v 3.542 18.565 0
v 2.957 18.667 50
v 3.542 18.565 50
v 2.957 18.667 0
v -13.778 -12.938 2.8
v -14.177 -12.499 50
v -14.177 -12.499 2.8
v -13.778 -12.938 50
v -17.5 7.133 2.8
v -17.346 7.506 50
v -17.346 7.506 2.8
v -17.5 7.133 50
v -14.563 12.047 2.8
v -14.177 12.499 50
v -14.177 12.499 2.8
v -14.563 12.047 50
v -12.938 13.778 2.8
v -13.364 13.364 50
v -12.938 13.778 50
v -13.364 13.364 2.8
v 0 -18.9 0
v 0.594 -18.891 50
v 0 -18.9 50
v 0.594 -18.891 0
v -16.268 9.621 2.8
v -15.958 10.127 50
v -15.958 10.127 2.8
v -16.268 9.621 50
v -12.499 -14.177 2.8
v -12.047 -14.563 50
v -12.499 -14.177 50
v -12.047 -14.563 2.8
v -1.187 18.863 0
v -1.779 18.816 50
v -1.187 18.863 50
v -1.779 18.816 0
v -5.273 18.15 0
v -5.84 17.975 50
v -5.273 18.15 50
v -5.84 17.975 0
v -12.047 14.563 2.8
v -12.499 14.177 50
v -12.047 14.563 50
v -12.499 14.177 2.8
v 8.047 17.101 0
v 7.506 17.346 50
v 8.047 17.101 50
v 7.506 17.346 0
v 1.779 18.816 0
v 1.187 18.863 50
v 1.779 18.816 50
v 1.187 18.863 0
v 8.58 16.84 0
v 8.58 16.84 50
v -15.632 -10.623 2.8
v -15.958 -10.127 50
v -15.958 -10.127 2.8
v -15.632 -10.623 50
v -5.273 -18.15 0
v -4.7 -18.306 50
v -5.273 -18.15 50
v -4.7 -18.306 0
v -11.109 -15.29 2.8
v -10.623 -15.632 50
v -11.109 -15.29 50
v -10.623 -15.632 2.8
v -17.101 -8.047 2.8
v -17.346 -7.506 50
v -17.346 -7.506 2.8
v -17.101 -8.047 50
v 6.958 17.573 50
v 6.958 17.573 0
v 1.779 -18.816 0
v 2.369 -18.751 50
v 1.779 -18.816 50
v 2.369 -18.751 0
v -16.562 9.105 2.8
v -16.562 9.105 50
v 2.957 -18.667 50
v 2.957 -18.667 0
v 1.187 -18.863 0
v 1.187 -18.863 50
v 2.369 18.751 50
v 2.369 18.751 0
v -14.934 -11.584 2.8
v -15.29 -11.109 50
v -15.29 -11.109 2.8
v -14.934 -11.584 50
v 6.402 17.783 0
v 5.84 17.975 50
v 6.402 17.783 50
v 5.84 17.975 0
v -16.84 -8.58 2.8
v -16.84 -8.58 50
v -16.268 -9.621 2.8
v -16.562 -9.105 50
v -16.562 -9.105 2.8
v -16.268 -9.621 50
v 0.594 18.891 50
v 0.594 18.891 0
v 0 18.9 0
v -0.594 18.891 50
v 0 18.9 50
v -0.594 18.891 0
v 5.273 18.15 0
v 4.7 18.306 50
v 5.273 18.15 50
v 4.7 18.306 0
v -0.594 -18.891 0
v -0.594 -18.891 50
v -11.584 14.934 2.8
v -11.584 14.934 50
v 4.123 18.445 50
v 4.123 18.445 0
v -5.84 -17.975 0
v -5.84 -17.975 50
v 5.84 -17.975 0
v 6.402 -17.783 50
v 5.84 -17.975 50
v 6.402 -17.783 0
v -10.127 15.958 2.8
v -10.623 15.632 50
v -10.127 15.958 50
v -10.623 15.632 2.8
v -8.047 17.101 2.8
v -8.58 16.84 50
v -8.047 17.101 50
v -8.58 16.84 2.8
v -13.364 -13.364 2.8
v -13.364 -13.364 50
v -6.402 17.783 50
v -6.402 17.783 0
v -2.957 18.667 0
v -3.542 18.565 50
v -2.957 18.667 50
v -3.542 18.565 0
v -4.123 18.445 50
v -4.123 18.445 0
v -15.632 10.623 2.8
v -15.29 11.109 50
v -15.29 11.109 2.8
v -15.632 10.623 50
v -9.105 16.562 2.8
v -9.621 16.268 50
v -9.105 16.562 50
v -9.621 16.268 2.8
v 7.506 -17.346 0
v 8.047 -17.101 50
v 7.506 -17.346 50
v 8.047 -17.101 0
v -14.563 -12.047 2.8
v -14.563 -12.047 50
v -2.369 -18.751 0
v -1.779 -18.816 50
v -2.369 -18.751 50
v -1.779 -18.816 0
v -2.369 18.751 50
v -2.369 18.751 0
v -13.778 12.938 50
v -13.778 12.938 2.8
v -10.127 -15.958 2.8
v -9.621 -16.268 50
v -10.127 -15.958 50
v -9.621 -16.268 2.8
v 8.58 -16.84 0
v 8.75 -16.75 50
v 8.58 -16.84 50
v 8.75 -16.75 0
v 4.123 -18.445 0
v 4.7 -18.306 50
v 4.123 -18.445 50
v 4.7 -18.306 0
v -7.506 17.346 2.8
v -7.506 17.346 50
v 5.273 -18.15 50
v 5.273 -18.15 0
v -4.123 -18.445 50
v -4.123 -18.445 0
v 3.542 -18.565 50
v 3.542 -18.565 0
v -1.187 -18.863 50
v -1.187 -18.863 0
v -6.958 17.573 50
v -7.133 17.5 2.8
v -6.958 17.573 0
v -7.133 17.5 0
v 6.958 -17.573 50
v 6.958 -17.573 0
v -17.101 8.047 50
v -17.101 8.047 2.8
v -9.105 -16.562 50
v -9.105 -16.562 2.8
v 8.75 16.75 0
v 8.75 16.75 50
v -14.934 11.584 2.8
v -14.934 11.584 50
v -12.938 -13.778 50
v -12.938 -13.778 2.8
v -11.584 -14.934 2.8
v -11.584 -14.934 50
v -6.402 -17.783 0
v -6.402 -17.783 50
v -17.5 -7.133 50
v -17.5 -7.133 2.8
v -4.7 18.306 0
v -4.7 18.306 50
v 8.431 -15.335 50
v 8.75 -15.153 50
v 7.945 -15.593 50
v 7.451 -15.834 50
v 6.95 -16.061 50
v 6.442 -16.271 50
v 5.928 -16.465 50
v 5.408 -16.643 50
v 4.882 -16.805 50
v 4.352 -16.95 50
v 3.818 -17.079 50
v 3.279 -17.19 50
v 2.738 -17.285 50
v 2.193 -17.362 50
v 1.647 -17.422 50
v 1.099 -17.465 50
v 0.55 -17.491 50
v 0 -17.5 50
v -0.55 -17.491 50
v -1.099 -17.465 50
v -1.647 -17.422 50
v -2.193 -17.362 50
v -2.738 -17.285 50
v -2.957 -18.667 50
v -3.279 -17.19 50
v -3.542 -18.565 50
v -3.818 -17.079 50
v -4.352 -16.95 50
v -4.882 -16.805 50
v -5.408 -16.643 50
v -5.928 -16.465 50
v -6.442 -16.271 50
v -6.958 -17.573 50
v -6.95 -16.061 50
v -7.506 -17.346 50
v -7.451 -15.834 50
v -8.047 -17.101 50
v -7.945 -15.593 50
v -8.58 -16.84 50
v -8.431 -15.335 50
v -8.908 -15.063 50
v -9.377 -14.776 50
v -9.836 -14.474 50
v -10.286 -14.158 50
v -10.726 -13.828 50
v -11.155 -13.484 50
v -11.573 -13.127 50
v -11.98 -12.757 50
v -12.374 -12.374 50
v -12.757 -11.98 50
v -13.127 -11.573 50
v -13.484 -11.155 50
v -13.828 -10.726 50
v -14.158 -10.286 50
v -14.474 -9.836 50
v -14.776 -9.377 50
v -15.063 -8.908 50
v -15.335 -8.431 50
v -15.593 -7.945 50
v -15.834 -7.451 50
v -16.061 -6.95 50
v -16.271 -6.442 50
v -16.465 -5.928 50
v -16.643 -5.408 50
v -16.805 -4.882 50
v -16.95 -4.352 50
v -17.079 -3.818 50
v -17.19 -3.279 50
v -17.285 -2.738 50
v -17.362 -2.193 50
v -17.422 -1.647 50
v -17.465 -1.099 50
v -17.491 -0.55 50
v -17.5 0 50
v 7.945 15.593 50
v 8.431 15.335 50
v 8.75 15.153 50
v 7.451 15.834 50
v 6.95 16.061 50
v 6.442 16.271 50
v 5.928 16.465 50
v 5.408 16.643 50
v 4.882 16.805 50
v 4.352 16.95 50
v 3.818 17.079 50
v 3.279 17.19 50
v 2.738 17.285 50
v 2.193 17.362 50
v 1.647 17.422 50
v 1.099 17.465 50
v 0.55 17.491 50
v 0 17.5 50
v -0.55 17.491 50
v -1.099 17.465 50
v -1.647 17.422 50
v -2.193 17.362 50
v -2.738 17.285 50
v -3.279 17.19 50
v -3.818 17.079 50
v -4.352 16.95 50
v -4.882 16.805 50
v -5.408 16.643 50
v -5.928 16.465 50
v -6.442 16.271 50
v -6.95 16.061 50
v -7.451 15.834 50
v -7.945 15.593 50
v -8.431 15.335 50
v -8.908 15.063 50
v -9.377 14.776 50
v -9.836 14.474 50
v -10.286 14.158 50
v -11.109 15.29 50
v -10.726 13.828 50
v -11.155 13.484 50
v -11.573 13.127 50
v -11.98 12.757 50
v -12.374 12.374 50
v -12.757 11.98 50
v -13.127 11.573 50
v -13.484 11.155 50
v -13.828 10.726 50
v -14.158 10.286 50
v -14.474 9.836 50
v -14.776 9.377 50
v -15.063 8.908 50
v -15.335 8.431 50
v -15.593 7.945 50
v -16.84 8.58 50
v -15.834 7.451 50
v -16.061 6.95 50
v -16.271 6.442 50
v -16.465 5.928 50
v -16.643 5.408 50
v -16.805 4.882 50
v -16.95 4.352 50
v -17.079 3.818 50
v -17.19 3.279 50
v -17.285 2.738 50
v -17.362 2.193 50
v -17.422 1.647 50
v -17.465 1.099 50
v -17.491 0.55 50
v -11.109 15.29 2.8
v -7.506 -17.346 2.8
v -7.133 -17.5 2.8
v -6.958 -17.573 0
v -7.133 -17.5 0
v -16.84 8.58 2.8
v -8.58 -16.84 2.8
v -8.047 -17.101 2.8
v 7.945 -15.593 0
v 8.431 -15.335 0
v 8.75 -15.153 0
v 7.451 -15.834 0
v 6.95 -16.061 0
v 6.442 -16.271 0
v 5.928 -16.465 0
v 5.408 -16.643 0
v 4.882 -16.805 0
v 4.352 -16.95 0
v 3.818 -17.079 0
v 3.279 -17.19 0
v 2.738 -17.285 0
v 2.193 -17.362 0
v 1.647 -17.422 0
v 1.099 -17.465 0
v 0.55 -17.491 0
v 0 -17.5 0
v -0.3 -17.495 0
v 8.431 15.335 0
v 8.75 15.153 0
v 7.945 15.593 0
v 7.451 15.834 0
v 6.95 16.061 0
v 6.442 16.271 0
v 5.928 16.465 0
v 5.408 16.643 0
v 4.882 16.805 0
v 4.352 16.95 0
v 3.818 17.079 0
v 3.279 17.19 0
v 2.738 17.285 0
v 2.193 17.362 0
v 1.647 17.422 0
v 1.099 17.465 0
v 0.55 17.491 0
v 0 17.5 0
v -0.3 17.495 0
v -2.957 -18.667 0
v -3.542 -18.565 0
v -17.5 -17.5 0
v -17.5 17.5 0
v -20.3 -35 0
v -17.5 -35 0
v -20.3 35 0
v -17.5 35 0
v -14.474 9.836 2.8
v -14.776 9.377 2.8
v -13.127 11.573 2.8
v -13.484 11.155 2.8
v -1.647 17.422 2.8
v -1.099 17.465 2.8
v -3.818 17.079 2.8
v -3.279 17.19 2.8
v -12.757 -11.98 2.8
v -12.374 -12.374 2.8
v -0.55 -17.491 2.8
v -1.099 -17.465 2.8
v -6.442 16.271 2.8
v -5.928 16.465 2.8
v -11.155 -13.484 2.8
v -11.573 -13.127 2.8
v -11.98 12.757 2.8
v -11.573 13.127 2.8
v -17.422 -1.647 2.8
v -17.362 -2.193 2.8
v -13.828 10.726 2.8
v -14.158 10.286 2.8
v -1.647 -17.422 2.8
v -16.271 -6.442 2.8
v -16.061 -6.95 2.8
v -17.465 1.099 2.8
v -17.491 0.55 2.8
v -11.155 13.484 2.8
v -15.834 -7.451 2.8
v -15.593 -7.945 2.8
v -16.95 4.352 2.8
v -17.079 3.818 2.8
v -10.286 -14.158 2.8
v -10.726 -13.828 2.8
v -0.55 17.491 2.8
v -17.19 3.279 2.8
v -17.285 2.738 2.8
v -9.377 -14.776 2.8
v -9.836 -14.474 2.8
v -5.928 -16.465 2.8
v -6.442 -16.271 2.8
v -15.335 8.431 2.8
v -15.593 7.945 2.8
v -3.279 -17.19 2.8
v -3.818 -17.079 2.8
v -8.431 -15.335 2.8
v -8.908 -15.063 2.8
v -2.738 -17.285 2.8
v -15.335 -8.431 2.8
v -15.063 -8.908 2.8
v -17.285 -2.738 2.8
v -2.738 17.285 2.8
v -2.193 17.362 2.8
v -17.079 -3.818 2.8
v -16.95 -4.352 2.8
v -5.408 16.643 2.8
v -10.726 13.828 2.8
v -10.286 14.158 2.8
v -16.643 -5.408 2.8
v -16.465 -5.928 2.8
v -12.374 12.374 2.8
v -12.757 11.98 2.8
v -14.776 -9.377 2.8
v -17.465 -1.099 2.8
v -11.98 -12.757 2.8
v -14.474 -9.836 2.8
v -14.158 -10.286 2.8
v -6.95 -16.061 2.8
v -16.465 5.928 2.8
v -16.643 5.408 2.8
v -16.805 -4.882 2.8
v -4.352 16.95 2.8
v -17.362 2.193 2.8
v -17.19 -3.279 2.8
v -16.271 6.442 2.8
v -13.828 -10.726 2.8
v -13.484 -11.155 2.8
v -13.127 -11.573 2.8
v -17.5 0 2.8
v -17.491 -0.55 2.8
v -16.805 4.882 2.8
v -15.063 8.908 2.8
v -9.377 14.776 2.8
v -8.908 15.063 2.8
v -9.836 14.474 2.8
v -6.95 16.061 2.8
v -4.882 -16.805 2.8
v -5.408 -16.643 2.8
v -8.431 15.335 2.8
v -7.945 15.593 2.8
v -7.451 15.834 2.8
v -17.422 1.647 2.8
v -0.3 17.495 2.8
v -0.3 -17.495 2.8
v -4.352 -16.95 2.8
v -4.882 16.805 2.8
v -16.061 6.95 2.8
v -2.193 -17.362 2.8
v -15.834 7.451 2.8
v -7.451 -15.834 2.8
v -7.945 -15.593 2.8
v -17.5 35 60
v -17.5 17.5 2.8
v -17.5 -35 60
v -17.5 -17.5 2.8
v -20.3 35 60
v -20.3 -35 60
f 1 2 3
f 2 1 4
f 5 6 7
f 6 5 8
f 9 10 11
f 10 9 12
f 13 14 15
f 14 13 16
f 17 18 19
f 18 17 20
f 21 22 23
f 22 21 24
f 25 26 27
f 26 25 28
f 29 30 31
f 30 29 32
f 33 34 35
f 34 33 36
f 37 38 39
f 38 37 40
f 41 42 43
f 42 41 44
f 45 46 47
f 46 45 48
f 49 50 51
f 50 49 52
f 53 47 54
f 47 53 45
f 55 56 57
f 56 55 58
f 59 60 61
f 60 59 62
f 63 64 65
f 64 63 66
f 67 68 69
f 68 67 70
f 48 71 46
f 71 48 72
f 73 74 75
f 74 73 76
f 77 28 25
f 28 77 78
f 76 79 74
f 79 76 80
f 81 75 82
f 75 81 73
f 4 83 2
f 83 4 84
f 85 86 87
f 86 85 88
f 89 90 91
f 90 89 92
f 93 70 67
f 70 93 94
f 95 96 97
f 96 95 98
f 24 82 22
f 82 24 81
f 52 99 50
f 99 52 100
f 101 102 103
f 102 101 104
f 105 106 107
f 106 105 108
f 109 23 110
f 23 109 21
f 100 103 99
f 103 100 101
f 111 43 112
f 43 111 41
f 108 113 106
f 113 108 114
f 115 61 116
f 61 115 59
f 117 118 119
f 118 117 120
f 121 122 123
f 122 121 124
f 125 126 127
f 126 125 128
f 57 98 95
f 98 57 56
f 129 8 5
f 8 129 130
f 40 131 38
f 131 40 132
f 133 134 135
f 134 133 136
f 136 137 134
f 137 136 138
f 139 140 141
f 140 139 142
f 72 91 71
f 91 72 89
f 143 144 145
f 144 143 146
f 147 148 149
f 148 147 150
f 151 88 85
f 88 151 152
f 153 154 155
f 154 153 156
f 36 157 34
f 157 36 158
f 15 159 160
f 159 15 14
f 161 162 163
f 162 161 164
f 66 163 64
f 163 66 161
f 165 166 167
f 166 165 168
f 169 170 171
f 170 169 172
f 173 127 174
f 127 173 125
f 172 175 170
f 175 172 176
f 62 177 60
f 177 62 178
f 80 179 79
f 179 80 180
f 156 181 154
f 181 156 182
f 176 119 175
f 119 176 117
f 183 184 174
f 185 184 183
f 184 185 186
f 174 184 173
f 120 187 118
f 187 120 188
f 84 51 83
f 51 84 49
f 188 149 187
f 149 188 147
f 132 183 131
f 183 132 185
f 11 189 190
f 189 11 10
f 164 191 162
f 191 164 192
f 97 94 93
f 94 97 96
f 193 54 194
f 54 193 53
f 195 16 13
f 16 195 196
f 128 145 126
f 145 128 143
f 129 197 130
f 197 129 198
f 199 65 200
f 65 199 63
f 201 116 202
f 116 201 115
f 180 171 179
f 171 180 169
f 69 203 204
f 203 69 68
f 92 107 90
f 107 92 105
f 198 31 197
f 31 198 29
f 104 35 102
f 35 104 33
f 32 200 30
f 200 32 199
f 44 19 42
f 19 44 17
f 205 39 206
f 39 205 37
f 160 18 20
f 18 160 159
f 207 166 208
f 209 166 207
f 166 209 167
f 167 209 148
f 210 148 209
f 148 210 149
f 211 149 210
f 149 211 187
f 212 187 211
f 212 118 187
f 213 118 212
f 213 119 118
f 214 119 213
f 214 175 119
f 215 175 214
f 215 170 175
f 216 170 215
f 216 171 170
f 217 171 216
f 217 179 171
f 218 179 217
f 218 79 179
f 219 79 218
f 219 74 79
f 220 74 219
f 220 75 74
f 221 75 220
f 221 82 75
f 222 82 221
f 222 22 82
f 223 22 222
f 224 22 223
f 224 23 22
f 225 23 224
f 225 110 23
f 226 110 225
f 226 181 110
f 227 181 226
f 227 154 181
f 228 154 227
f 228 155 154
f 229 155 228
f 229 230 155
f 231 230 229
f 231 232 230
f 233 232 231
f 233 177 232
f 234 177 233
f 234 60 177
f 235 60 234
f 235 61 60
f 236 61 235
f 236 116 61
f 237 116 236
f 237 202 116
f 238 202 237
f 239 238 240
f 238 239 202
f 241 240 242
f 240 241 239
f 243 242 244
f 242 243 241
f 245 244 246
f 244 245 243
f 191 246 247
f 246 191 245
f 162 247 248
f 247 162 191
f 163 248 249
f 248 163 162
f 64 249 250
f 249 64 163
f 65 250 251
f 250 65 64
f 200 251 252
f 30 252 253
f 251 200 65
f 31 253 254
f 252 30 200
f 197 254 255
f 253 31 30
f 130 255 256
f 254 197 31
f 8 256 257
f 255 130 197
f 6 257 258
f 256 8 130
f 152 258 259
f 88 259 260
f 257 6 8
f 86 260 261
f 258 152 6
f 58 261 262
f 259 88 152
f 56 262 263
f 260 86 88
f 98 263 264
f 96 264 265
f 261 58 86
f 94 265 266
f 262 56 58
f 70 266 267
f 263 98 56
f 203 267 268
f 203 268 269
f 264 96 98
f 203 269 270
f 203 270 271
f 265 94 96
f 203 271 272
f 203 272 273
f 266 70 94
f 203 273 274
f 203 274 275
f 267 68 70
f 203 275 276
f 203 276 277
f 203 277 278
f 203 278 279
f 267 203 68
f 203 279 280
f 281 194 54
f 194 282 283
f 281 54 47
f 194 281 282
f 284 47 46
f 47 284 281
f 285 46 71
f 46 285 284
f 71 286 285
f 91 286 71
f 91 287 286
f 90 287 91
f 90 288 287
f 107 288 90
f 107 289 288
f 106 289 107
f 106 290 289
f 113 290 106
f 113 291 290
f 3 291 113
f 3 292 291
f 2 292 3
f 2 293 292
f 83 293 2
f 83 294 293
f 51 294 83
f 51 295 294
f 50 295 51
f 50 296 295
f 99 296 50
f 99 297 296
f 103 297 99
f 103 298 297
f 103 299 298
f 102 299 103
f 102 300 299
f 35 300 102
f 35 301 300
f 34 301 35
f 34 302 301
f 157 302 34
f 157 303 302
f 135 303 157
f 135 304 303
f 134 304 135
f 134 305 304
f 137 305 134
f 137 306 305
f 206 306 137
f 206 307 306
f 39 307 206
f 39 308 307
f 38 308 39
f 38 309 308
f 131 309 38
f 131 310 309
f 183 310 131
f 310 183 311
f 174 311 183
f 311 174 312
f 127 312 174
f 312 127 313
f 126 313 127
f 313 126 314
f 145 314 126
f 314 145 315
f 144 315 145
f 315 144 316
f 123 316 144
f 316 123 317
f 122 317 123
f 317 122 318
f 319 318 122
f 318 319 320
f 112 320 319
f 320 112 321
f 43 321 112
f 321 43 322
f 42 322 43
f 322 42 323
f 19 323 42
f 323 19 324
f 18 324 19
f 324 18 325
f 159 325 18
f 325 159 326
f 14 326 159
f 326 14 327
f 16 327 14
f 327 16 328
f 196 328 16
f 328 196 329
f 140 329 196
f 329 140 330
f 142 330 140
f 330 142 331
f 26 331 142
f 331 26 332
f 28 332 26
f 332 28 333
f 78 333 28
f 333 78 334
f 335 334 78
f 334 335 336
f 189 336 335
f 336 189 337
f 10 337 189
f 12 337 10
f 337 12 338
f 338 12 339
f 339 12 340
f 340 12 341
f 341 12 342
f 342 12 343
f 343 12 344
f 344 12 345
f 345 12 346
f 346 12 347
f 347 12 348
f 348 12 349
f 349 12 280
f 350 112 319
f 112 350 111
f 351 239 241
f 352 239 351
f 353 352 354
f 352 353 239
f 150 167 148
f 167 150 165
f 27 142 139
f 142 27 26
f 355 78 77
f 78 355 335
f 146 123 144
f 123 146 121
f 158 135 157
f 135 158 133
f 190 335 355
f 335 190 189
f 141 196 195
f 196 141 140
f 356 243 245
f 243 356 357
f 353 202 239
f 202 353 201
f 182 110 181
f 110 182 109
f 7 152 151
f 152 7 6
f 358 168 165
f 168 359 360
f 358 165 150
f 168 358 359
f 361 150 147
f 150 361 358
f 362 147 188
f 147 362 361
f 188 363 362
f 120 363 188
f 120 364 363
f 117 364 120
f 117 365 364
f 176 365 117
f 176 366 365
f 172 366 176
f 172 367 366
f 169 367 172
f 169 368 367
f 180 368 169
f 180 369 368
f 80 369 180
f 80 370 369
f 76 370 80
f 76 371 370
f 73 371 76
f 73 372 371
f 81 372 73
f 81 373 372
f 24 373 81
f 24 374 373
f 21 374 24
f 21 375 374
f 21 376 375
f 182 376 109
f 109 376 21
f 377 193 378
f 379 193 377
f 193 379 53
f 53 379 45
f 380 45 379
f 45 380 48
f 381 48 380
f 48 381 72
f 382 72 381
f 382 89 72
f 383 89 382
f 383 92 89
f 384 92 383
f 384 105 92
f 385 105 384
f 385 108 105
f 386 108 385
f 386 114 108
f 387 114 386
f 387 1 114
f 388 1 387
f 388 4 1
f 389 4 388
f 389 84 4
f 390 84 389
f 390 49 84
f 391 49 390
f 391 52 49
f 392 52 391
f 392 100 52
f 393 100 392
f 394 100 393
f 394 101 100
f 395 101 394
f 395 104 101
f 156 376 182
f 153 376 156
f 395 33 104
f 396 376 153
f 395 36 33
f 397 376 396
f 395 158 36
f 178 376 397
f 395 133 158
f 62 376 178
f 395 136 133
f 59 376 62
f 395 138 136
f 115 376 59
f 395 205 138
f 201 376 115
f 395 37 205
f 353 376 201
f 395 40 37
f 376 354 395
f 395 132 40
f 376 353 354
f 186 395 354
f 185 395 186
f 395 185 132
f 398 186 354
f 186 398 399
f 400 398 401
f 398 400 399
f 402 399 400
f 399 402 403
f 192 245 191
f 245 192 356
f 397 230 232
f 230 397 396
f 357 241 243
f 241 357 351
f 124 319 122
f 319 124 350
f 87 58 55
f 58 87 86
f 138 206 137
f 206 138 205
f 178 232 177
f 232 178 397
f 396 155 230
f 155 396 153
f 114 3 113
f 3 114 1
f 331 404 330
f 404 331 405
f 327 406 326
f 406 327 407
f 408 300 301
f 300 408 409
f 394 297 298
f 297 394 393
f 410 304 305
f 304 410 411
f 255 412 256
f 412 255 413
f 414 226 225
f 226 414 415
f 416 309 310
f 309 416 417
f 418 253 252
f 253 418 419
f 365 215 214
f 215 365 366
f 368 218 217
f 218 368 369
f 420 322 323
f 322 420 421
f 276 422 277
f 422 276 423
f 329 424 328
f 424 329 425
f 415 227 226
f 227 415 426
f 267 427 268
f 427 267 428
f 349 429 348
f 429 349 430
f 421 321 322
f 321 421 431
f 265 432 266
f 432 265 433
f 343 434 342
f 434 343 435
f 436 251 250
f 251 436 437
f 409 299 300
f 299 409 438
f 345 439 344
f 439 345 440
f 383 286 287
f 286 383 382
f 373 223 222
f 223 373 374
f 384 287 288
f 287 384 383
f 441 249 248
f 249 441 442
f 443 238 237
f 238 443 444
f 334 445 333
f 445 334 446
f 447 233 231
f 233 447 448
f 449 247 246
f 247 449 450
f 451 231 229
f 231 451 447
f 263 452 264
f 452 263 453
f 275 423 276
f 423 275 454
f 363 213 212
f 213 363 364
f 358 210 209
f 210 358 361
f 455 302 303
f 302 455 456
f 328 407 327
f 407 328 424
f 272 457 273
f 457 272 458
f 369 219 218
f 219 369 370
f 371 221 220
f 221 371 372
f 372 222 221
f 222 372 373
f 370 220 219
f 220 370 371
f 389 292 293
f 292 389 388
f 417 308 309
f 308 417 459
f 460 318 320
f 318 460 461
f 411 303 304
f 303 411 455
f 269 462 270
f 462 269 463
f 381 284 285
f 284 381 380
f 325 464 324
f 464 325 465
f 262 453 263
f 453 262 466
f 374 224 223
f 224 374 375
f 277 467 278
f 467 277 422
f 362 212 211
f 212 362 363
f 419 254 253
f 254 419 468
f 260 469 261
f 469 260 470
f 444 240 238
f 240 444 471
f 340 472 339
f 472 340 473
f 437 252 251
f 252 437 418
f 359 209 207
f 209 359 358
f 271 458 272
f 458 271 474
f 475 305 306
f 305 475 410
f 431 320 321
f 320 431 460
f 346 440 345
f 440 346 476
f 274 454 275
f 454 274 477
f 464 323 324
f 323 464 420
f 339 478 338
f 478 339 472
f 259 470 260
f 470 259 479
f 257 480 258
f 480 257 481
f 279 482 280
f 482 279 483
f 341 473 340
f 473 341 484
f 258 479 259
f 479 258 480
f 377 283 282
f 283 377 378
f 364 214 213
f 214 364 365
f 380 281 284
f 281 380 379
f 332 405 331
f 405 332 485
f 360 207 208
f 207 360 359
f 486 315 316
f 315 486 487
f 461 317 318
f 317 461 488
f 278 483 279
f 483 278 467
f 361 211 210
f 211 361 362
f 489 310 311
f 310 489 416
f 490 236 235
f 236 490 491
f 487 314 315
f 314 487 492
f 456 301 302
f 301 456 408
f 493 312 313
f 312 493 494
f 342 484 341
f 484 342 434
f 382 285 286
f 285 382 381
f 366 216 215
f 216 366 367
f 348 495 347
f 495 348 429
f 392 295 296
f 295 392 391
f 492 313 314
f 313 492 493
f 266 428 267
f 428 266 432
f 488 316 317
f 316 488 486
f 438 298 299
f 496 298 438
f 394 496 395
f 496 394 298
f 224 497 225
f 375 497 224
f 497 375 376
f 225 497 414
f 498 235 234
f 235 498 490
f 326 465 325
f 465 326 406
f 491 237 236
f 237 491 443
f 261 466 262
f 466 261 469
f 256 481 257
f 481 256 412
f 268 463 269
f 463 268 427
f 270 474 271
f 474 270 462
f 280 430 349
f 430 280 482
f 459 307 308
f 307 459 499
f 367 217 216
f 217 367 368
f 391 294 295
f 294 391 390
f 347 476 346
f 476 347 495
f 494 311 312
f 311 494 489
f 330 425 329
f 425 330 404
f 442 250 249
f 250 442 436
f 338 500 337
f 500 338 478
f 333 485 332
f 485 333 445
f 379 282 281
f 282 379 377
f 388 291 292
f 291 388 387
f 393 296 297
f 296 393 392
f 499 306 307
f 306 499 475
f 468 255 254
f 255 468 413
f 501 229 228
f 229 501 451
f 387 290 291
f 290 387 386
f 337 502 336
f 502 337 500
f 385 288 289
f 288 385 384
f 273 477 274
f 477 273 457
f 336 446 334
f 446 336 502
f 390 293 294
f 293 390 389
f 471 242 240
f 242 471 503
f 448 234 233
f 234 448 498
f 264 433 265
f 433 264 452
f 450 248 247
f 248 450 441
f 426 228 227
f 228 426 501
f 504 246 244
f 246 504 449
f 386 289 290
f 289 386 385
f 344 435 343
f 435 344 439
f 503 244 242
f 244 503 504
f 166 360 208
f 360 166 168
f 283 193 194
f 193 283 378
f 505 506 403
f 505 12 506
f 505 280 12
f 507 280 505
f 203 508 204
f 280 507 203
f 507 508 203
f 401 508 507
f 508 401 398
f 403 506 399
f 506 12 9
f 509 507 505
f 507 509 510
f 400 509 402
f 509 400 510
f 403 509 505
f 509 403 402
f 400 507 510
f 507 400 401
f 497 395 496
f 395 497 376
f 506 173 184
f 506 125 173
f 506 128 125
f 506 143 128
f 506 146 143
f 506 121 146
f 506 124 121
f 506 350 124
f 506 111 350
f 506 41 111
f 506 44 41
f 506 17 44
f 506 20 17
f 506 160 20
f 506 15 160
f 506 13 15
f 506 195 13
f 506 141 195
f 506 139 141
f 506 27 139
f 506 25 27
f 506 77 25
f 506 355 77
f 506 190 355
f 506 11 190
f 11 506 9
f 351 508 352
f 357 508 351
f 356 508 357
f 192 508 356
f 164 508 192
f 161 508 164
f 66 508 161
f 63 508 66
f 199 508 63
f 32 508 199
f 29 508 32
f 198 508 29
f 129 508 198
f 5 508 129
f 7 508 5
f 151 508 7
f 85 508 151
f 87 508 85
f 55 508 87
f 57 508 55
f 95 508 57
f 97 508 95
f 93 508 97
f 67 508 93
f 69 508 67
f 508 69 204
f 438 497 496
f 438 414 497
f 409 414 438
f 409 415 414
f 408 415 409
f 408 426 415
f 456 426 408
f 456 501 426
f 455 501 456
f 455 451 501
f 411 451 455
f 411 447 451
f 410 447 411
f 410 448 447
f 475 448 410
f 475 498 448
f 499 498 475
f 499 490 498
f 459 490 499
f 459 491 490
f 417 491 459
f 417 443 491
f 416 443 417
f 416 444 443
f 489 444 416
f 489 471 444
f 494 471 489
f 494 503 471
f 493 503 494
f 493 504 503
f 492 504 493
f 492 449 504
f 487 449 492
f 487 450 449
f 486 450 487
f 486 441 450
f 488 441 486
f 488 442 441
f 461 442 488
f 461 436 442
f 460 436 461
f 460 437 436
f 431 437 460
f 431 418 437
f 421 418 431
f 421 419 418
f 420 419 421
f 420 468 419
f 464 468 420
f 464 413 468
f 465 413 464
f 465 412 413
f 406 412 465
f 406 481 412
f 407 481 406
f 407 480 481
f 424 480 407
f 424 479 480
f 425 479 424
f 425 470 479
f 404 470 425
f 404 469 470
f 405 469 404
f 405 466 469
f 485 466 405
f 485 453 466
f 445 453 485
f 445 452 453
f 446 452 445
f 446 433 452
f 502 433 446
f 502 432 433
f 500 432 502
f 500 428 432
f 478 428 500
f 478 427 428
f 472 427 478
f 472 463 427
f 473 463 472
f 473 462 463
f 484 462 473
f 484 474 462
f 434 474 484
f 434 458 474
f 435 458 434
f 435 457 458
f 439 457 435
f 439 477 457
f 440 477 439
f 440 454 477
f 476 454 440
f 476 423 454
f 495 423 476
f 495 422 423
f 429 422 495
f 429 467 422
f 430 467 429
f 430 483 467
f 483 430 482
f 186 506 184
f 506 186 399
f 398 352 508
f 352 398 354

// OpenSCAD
// pepper spray can holder
// always prepared at entry door
// 20151113 WA


// grip height
$h=50;
// top overlap 
$ol=10;
// can diameter
$d=35;
// wall thicknes
$ws=2.8;
// bottom stop depth
$bsd=20;
//  
$fn=200;



difference(){

    
    cylinder(r=$d/2+$ws/2,h=$h);
    
    translate([0,0,-0.2])
    cylinder(r=$d/2,h=$h+0.4);
    
    translate([$d/4,-$d/2,-0.2])
    #cube([$d-$d/2,$d,$h+0.4]);
    
    
}

translate([-$d/2-$ws,-$d,0])
cube([$ws,$d*2,$h+$ol]);

translate([-$d/2-$ws,-$d/2,0])
cube([$bsd,$d,$ws]);
